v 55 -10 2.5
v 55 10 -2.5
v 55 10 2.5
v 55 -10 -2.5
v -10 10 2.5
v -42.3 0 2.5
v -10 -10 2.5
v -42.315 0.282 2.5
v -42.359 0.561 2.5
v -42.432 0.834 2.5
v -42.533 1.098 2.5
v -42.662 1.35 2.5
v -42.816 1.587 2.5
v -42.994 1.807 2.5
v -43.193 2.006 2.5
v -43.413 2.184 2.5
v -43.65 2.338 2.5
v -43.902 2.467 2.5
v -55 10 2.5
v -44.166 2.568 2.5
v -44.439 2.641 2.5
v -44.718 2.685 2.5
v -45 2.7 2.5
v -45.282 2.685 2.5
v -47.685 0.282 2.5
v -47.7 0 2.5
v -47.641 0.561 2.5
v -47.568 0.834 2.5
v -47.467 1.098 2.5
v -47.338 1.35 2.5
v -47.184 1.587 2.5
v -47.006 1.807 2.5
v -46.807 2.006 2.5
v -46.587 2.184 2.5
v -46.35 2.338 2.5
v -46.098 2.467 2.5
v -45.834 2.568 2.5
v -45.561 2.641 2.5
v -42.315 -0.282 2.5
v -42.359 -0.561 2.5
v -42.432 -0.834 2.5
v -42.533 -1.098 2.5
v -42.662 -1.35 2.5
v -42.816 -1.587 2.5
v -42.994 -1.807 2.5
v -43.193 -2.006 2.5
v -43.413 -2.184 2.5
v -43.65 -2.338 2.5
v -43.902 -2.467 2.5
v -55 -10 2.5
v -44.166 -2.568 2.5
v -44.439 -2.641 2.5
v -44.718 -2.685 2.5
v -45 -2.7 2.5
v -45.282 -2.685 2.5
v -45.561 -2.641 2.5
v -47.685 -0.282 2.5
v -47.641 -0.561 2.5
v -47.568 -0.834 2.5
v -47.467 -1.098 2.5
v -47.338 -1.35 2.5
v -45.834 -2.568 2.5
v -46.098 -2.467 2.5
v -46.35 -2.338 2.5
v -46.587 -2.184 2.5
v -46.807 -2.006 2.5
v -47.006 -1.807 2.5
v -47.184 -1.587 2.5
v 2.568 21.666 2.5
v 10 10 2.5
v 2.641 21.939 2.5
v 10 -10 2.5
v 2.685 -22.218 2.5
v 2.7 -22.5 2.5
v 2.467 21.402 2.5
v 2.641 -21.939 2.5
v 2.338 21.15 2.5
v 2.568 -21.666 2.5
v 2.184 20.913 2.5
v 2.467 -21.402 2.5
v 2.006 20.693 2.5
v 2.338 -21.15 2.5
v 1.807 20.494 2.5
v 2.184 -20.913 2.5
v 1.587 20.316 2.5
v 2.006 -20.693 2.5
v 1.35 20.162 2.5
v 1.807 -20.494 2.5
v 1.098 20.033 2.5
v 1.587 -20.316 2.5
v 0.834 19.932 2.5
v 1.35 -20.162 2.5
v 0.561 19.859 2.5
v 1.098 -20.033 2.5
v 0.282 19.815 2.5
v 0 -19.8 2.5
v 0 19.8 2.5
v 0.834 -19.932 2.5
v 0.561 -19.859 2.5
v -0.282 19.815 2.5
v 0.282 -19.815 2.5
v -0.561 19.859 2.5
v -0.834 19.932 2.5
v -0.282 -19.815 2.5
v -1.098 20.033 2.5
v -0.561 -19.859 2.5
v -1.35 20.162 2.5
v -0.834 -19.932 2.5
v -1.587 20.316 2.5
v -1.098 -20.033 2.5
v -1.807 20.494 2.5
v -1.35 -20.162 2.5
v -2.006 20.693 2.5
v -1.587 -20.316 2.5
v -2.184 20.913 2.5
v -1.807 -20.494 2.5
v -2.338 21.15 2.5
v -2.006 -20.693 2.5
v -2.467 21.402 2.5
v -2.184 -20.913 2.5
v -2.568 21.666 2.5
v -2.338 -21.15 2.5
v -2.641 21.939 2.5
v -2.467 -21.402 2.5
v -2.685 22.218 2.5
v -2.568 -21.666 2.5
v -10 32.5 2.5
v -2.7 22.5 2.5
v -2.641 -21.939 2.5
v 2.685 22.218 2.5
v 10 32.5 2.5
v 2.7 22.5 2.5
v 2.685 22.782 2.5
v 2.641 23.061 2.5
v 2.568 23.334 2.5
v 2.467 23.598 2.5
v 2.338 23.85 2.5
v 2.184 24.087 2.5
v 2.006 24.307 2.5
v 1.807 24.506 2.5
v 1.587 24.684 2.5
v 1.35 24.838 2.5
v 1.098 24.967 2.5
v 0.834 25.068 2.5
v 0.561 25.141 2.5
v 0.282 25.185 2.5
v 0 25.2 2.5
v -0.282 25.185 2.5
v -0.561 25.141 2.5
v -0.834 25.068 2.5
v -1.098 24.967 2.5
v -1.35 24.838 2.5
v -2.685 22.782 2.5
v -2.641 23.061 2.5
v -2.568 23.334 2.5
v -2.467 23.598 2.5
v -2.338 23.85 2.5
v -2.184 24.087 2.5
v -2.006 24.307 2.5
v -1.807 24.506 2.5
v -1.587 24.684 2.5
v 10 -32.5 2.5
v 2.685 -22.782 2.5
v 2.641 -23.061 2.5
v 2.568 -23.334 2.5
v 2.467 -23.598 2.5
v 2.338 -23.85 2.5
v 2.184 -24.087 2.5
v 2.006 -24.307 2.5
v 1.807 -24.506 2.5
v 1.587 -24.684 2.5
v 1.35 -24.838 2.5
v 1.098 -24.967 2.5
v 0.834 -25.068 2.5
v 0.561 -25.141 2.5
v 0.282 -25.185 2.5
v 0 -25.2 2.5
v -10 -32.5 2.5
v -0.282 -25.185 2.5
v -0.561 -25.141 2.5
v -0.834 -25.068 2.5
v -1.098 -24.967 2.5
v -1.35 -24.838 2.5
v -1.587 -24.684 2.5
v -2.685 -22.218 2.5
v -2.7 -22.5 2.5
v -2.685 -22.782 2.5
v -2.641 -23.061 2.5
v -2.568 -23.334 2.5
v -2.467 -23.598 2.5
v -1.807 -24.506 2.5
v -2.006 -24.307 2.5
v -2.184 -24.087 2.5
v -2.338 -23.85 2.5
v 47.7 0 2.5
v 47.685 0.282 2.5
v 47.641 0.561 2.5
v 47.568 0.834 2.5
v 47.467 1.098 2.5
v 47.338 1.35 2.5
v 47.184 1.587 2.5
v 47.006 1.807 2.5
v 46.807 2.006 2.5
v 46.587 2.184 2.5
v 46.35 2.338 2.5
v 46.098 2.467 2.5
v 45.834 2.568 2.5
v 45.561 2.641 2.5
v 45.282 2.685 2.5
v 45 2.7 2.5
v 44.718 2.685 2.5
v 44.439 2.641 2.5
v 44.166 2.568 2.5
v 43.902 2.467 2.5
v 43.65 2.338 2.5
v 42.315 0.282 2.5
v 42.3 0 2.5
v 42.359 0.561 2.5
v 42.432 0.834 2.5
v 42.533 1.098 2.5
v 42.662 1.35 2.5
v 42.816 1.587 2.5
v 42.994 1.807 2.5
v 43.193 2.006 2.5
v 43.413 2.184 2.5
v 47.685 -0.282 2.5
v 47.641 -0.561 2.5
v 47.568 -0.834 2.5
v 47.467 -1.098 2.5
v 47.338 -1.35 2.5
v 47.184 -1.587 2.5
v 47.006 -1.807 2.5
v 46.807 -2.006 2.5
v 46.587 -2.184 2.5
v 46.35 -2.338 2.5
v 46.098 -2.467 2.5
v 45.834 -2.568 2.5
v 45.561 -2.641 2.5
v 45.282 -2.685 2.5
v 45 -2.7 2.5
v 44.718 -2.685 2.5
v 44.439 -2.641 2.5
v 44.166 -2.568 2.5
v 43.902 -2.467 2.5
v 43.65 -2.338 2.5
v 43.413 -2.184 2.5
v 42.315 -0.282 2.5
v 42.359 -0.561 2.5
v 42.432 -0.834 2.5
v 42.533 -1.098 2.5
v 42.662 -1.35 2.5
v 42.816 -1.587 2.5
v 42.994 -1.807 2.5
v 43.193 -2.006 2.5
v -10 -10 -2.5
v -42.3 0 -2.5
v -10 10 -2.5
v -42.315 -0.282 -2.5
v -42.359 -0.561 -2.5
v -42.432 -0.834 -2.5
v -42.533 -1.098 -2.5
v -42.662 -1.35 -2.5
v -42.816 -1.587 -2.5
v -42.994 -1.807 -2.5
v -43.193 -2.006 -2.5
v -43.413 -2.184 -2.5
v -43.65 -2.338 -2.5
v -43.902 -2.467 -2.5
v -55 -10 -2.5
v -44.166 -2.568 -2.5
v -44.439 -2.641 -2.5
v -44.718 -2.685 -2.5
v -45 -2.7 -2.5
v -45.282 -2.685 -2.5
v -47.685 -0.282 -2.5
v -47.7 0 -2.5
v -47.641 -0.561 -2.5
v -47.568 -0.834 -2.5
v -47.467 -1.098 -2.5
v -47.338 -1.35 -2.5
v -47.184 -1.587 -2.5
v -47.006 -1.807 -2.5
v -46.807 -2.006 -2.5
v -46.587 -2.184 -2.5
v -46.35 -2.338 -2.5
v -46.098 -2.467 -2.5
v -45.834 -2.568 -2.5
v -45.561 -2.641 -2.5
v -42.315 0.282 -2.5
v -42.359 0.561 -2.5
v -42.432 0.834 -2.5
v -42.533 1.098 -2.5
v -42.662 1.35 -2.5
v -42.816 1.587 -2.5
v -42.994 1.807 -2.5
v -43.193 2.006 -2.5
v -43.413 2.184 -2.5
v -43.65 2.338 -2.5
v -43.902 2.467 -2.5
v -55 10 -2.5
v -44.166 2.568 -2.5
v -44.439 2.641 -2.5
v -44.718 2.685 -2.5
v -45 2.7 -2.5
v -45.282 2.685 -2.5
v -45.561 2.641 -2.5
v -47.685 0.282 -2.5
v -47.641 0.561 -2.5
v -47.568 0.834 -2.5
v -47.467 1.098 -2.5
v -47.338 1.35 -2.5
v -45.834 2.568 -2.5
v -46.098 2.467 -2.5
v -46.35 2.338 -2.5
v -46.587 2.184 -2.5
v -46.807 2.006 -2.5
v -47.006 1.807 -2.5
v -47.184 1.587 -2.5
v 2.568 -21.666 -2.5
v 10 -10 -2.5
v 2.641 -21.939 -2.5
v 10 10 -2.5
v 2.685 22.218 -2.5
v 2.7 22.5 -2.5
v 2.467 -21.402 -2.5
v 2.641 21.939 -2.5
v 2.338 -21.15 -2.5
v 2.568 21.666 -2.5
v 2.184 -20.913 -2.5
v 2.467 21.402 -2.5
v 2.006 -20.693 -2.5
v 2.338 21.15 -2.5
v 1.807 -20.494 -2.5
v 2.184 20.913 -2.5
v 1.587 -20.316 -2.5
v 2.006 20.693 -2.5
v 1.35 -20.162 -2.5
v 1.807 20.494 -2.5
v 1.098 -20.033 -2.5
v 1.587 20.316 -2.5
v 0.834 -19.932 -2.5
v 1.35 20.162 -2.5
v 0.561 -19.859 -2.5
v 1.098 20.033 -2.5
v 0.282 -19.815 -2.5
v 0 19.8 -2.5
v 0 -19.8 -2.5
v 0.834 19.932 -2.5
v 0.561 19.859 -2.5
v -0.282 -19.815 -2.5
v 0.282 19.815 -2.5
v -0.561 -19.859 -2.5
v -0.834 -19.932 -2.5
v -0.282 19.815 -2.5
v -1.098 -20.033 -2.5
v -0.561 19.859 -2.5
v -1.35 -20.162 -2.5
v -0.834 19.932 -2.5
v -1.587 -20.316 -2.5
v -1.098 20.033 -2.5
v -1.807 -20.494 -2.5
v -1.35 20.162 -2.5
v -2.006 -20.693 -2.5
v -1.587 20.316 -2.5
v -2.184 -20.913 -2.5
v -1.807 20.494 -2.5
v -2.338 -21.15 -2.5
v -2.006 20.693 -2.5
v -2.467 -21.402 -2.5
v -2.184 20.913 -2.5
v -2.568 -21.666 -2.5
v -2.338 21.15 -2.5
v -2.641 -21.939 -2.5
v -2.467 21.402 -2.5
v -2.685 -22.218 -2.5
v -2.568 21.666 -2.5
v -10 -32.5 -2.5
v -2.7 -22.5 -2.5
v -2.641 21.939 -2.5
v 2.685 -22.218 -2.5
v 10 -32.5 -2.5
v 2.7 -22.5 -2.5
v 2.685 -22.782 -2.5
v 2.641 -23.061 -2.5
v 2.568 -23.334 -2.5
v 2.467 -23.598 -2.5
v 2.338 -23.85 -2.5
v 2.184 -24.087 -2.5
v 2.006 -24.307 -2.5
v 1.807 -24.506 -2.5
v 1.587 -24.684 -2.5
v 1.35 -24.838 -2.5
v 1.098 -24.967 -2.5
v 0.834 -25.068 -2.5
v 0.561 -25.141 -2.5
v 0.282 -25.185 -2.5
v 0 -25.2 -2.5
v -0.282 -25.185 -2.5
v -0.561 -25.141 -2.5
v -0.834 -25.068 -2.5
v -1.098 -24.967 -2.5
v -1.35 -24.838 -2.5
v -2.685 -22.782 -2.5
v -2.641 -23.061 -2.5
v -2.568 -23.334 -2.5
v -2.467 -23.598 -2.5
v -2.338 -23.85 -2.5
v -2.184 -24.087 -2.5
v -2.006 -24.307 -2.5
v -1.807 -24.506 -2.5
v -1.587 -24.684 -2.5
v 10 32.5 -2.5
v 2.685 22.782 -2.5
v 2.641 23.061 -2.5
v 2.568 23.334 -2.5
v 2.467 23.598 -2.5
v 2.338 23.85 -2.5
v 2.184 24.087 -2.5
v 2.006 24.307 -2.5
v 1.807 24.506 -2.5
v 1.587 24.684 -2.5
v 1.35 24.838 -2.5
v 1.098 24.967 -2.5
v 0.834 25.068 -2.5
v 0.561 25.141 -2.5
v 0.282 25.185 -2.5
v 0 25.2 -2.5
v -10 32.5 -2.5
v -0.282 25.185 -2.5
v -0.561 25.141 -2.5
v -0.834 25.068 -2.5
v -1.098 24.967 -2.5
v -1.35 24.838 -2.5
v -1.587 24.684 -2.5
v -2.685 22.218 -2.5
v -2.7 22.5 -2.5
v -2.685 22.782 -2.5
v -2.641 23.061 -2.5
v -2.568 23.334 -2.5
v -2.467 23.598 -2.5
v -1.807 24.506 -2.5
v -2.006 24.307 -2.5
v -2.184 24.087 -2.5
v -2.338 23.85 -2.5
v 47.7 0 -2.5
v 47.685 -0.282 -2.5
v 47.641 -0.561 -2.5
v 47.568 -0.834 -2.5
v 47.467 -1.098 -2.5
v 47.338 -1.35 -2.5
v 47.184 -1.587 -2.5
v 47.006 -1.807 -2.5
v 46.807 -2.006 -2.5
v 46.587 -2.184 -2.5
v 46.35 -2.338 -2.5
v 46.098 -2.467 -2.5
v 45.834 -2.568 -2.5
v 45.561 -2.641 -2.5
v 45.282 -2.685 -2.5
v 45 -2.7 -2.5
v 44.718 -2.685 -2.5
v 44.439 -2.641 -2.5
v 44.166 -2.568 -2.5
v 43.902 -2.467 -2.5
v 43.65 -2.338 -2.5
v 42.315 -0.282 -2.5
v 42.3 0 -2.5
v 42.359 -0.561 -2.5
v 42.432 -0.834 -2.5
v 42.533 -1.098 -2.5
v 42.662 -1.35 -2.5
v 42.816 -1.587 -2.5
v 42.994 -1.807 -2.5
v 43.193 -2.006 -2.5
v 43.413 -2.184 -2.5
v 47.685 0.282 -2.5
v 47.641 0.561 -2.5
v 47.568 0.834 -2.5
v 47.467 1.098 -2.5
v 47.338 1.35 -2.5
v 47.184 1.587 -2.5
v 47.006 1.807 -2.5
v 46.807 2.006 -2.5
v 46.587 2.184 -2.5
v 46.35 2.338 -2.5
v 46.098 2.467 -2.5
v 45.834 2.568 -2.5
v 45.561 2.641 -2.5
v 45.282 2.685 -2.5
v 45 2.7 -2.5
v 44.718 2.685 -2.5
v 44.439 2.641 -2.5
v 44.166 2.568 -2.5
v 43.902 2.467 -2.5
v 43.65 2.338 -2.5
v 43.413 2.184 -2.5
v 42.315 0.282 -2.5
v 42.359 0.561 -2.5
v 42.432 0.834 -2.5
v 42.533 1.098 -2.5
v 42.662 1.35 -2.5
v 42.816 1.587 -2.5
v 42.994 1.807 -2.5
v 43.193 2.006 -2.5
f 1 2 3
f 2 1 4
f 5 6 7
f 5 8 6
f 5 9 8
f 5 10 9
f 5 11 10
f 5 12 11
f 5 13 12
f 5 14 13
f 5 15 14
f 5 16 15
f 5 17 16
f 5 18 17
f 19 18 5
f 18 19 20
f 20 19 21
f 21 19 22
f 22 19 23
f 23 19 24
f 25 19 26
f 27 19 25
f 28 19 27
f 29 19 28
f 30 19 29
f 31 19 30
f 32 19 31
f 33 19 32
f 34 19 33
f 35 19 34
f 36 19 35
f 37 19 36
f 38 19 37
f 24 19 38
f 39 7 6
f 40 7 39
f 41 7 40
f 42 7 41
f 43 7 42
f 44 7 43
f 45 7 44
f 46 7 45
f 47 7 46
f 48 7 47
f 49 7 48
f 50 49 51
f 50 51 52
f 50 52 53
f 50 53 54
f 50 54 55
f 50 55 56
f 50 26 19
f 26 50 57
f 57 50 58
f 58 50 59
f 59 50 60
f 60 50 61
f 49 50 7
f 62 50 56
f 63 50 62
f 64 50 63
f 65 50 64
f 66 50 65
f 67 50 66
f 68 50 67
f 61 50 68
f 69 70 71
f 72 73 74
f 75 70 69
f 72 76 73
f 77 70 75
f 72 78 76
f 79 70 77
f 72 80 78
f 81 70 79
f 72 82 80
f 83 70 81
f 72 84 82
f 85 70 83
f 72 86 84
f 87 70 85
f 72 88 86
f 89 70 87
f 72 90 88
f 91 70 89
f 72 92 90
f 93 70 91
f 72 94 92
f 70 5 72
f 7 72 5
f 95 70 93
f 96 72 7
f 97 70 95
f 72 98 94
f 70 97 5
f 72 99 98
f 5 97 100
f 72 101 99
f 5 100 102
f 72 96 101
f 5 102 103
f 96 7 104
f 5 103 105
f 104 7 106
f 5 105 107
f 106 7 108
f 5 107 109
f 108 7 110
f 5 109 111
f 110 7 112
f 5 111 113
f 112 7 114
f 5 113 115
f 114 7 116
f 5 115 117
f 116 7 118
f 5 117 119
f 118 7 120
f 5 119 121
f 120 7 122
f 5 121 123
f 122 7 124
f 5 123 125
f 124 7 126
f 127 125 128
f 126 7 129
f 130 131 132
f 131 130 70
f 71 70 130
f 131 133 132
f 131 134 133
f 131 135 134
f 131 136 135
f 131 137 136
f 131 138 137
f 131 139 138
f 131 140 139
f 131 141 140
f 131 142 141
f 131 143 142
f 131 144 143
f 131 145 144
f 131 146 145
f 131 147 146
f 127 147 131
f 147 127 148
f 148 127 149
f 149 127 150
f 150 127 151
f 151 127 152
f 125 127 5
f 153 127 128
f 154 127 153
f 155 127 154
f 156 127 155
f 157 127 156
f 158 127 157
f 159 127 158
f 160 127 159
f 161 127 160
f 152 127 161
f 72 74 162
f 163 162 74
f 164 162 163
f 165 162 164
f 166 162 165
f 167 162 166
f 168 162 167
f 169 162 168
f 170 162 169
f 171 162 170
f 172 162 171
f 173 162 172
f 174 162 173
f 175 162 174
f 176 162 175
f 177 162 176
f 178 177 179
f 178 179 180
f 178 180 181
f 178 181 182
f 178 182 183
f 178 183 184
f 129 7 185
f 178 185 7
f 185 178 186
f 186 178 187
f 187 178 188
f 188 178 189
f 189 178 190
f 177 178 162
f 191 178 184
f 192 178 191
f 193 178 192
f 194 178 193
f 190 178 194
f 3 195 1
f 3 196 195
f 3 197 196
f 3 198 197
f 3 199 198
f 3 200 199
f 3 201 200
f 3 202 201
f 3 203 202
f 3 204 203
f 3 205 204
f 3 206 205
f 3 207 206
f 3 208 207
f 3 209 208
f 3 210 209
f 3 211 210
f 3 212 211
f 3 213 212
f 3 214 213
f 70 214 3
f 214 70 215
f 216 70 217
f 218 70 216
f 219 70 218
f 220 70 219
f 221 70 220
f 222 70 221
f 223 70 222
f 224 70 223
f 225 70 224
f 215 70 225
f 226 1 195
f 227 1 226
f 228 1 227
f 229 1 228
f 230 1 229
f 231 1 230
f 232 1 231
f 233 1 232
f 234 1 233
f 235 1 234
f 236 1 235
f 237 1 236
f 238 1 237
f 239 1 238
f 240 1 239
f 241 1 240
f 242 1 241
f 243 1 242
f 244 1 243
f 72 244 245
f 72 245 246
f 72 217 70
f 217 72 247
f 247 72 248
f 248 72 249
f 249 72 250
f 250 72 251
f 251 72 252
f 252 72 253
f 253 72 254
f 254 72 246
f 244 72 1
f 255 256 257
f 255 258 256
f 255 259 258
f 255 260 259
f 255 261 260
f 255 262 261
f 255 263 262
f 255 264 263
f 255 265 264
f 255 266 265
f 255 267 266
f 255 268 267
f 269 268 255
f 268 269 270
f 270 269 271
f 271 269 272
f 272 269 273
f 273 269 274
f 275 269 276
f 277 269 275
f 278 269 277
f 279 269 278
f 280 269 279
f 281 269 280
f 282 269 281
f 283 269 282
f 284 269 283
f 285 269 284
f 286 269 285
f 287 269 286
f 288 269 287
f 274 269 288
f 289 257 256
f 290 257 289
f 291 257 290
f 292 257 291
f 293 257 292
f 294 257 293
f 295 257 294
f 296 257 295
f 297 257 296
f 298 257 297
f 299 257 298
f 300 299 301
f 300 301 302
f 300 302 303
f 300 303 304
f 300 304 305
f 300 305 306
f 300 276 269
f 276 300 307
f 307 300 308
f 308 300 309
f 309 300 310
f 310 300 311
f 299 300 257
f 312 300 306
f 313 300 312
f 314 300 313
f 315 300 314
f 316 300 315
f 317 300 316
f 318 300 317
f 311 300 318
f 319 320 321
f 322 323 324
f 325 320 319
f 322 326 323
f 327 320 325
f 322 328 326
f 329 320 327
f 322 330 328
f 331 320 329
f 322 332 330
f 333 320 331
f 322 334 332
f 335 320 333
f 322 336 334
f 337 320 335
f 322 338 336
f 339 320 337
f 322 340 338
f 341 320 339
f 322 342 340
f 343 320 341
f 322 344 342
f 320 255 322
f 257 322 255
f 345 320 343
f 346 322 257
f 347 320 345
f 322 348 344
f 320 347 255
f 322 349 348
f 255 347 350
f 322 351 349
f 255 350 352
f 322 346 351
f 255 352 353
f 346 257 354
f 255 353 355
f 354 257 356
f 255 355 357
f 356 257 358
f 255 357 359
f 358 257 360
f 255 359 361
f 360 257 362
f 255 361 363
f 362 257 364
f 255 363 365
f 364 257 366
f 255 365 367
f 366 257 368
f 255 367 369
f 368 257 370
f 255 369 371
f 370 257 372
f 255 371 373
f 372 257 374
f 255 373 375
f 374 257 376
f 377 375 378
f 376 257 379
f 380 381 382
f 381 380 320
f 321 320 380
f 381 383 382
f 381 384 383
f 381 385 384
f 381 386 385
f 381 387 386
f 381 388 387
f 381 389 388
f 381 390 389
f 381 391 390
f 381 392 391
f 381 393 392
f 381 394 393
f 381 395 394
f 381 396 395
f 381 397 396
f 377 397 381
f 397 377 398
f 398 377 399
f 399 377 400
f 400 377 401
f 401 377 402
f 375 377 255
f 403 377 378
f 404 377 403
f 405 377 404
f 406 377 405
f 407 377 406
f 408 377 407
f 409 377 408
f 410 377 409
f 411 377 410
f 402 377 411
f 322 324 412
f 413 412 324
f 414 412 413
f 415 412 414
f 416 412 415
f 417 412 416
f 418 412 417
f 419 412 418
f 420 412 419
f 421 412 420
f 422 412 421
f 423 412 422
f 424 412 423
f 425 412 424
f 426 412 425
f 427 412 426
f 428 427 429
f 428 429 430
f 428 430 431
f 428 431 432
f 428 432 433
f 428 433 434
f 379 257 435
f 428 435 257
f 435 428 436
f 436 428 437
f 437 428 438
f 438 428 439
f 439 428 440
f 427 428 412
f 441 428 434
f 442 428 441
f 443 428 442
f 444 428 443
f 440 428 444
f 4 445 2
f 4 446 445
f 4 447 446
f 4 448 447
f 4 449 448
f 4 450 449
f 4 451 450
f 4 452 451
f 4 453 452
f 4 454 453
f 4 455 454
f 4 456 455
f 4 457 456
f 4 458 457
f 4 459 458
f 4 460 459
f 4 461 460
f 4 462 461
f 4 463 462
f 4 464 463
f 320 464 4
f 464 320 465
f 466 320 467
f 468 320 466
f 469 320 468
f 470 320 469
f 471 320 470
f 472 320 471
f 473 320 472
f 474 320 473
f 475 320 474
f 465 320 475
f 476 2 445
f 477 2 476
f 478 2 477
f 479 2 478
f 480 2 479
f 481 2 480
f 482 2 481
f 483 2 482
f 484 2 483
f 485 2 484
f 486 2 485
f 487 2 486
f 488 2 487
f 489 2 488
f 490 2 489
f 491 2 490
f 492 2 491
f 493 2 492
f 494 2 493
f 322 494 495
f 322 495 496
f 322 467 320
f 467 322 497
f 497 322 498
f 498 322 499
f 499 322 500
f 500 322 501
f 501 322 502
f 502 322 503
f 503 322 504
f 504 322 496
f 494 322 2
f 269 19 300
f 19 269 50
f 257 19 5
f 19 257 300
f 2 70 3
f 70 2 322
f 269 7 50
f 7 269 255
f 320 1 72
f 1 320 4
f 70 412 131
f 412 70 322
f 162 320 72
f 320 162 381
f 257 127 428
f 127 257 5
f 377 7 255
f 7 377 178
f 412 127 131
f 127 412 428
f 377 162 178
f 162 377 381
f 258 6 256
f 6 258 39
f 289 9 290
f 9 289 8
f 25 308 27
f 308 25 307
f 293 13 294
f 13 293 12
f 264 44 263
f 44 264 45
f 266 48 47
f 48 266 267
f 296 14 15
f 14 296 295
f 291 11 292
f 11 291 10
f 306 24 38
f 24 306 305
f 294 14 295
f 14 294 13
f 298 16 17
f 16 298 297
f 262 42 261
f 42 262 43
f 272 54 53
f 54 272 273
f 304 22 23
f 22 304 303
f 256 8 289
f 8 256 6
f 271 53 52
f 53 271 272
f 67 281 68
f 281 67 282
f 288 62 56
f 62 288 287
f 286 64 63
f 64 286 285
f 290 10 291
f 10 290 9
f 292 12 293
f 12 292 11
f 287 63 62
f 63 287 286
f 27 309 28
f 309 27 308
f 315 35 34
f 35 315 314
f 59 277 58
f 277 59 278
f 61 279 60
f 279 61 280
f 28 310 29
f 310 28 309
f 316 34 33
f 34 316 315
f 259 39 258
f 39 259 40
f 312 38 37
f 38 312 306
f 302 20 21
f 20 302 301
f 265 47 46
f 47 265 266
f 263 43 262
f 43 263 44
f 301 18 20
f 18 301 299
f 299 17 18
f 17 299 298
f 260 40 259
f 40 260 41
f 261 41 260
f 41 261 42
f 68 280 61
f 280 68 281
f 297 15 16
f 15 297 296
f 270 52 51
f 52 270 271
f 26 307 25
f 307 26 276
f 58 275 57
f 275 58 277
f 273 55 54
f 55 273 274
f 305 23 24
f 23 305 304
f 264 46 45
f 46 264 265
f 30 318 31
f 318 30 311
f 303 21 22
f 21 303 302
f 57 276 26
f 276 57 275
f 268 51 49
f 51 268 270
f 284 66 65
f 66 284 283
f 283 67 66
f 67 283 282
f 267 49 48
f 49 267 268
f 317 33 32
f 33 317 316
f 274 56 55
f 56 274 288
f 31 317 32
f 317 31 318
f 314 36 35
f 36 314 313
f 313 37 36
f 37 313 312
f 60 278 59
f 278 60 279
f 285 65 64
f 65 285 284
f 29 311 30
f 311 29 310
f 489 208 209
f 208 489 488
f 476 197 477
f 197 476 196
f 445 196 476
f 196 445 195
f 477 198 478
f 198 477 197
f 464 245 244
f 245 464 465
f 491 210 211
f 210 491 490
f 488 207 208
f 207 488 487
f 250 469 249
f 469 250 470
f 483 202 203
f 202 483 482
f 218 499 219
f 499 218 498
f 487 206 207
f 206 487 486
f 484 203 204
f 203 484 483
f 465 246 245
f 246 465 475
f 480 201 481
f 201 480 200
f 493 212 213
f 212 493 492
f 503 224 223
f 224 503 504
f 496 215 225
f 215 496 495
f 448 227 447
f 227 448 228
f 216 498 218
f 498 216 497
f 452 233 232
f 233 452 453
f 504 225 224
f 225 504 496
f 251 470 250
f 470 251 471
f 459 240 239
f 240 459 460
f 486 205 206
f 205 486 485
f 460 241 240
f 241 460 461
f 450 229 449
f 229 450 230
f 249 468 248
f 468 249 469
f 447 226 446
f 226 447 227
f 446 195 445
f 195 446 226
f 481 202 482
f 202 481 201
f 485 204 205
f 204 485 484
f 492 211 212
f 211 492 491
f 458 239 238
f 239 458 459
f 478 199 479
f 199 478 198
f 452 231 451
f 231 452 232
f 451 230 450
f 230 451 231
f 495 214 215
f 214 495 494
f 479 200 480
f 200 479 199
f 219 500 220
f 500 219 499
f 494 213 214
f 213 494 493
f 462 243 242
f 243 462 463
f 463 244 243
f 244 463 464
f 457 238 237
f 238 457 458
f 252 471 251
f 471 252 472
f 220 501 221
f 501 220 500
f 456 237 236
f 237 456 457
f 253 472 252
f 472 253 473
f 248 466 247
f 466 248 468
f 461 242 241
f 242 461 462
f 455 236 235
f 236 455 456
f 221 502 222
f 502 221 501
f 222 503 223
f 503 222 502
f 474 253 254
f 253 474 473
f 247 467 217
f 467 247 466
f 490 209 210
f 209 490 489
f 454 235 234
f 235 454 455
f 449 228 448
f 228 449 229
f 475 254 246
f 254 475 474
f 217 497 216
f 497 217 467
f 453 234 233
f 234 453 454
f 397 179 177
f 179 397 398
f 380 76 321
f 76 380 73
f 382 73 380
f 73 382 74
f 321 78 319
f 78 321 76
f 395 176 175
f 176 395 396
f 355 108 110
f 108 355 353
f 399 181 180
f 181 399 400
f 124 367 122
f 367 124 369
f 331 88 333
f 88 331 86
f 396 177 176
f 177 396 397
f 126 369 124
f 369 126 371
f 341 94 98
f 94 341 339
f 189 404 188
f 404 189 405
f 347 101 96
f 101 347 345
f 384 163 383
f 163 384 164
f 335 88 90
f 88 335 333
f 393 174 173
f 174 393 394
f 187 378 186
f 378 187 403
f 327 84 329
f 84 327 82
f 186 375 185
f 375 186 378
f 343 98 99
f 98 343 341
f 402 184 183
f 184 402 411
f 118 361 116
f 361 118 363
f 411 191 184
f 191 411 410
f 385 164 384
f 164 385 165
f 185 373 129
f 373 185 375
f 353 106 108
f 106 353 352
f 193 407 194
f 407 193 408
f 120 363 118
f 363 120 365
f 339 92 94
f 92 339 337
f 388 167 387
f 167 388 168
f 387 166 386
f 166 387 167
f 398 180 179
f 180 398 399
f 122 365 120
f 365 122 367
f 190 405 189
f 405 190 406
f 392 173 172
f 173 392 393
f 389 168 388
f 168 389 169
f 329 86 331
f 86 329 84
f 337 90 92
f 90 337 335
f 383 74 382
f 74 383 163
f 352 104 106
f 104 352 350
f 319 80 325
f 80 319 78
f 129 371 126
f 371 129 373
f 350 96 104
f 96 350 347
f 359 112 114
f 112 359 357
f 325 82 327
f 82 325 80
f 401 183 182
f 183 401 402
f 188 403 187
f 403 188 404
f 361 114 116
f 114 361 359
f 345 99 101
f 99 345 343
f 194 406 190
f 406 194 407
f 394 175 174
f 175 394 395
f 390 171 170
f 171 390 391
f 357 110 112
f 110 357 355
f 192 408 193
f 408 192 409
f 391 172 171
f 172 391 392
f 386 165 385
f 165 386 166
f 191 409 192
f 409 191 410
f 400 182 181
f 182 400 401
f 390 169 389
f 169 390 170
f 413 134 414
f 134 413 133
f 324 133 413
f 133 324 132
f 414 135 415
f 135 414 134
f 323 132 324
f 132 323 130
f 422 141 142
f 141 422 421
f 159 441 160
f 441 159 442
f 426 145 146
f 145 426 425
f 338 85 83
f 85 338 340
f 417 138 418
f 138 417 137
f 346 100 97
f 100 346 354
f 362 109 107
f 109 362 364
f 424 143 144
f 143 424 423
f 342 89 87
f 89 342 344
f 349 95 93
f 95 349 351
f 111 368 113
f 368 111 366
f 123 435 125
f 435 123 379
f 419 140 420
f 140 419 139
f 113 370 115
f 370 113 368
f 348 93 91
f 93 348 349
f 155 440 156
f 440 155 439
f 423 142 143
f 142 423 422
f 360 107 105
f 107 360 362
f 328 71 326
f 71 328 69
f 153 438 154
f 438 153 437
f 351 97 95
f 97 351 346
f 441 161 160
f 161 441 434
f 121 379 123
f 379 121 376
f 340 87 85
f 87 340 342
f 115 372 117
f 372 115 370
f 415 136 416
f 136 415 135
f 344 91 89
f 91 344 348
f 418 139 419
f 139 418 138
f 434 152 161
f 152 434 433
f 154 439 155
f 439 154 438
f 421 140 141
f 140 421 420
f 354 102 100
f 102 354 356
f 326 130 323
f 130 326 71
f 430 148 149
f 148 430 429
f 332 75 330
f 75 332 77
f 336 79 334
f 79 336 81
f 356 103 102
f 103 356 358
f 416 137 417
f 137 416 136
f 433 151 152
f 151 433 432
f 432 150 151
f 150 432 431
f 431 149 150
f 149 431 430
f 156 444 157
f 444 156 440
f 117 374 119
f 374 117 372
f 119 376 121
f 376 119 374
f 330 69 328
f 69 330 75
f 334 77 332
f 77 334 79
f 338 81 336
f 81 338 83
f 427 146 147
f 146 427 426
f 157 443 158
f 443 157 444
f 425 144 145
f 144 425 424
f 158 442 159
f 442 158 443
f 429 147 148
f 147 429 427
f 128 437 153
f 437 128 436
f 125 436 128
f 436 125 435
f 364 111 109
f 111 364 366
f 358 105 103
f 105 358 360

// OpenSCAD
// T-shaped mounting plate.
$fn = 60;
eps = 0.02;
stem_l = 110;
arm_l = 65;
width = 20;
thickness = 5;
difference() {
    union() { cube([stem_l,width,thickness],center=true); cube([width,arm_l,thickness],center=true); }
    for (p=[[-stem_l/2+10,0],[stem_l/2-10,0],[0,-arm_l/2+10],[0,arm_l/2-10]]) translate([p[0],p[1],-thickness/2-eps]) cylinder(d=5.4,h=thickness+2*eps);
}
